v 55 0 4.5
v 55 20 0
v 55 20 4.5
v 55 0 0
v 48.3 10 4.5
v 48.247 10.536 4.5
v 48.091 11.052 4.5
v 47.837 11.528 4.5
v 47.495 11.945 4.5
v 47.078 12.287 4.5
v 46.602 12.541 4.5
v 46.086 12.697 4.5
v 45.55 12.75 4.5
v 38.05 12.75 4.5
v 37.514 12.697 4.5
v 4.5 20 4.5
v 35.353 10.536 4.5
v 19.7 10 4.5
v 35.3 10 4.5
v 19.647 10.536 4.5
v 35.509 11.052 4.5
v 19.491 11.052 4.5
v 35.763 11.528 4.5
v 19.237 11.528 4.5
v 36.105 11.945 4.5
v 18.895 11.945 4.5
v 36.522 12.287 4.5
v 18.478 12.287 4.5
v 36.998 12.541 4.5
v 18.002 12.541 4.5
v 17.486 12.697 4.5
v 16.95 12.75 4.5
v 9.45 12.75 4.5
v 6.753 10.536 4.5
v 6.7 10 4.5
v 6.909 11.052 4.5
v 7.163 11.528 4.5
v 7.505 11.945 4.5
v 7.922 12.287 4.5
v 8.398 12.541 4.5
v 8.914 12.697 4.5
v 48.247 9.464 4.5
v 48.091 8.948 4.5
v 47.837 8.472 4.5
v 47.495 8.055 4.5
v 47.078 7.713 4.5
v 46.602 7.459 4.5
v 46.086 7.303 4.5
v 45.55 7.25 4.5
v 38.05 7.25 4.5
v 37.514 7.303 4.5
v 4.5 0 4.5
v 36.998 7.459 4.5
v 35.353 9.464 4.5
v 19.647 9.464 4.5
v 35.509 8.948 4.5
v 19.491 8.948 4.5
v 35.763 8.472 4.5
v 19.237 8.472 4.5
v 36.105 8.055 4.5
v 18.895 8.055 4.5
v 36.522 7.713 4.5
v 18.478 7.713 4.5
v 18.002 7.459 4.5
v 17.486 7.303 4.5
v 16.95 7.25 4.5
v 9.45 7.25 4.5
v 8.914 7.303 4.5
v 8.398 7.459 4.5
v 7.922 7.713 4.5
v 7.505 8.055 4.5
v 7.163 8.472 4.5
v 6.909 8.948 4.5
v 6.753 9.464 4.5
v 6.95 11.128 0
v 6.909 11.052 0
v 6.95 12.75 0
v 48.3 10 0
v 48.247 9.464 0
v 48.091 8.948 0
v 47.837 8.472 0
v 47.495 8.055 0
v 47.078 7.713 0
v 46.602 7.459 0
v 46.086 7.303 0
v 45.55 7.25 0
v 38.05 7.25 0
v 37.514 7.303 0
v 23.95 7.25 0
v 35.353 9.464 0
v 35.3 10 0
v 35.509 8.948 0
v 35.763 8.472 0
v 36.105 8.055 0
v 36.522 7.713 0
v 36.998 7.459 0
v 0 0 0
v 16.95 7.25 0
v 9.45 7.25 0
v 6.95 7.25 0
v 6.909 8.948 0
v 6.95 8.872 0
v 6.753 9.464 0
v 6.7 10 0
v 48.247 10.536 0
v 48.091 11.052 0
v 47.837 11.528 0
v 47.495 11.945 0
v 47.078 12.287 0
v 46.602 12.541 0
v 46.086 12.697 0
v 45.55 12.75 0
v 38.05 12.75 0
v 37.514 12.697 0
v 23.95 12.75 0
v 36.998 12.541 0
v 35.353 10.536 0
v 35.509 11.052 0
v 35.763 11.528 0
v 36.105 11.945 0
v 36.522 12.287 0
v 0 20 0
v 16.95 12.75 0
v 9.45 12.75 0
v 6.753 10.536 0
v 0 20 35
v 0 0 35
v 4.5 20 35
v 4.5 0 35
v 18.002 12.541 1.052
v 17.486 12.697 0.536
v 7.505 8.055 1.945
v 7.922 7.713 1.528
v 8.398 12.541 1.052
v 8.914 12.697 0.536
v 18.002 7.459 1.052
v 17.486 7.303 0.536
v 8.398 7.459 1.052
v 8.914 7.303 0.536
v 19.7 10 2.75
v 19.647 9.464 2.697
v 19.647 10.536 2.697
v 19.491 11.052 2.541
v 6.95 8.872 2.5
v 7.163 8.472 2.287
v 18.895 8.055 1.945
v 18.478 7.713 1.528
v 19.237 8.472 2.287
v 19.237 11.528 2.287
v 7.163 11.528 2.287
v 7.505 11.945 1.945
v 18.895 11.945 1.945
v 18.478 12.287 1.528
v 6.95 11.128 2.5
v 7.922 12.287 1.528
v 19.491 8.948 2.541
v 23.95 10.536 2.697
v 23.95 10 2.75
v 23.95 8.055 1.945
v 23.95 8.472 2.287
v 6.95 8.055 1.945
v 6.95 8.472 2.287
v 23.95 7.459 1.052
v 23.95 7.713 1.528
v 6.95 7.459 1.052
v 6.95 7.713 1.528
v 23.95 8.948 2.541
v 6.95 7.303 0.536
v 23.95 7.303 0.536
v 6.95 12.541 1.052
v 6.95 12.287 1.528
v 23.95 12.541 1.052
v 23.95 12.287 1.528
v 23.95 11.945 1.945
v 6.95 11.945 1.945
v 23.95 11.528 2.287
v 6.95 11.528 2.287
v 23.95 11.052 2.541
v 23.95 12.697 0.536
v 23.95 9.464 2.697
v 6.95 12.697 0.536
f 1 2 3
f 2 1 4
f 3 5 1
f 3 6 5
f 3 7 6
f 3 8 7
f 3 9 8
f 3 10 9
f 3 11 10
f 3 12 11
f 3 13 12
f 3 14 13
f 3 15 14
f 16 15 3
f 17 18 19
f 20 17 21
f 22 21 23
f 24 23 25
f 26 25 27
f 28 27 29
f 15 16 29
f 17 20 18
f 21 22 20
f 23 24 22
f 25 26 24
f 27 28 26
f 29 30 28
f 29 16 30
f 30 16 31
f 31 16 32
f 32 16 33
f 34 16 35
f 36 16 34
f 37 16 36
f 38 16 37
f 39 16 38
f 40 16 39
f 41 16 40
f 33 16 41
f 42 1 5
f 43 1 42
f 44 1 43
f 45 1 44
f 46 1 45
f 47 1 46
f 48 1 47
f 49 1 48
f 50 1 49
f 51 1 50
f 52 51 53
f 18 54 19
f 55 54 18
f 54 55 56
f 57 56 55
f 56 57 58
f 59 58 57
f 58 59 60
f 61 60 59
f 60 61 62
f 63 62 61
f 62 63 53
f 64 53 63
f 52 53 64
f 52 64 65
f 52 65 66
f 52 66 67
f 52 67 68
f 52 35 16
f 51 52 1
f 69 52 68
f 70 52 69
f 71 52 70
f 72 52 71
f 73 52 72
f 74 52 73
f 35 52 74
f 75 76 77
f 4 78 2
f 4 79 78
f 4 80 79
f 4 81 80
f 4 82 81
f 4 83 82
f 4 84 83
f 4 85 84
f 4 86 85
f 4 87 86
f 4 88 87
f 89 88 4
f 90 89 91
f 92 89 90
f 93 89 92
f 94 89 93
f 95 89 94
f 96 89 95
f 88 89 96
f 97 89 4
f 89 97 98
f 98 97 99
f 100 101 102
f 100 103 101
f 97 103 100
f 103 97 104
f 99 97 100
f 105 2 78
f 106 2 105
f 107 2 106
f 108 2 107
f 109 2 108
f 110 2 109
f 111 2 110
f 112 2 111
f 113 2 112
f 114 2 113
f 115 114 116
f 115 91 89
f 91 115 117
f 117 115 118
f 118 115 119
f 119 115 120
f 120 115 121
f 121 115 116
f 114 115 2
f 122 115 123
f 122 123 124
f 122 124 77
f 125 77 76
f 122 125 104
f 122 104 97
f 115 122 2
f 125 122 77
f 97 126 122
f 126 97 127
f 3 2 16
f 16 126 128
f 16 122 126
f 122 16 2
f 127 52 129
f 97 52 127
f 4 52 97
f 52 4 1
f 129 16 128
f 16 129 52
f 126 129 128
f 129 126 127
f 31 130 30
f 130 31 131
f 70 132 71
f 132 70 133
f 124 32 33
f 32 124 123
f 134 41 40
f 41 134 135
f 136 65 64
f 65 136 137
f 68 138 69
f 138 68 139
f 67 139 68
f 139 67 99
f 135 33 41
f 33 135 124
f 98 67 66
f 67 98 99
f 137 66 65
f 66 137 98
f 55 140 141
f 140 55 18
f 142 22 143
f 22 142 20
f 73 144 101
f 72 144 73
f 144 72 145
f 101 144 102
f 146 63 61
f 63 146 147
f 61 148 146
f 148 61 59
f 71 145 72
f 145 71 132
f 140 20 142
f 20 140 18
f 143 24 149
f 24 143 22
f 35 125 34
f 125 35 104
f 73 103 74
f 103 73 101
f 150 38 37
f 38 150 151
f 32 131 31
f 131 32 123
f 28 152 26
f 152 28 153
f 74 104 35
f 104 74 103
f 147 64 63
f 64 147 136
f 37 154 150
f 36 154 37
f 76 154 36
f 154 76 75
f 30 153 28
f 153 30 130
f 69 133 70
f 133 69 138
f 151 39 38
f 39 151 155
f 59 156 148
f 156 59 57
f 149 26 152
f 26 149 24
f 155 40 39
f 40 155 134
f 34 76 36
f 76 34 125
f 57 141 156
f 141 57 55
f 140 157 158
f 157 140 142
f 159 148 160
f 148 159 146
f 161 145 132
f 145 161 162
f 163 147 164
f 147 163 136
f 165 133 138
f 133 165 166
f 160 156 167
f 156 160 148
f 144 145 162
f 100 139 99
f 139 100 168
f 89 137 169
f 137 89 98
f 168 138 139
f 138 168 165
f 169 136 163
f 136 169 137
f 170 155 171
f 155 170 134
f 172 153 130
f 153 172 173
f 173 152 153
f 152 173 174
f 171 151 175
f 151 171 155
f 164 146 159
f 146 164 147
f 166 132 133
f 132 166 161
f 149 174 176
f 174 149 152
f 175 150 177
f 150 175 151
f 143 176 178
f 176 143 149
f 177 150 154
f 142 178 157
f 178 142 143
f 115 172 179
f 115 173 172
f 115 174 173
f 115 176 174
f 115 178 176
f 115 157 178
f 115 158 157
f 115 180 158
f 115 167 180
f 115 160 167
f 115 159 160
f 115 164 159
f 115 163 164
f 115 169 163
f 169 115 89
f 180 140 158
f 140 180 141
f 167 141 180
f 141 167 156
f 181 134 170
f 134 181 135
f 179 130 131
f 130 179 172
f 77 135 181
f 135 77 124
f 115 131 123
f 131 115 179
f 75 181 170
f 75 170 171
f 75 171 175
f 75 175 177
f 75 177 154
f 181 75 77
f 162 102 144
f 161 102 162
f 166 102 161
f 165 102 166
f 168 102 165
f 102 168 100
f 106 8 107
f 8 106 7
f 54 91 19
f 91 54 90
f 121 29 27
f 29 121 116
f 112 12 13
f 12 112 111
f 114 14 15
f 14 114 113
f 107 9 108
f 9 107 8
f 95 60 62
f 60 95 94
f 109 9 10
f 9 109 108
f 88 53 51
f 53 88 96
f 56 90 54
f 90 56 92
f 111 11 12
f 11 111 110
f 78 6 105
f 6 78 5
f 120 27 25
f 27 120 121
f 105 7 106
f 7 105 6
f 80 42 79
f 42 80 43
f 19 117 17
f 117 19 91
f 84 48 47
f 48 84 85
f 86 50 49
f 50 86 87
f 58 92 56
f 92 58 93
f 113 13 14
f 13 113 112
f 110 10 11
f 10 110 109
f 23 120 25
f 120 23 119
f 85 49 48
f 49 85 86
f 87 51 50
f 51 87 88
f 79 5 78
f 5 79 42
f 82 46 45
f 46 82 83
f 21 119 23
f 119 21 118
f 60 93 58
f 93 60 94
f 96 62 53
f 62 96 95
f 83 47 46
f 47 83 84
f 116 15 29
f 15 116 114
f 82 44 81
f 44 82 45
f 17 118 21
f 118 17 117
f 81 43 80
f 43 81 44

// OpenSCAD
$fn = 32;

// ----------------------------------------------------------------------
// L-bracket: 55 x 20 x 35 mm
// ----------------------------------------------------------------------

// --- parameters (mm) ---
horiz_len = 55;           // horizontal leg, X
vert_len = 35;            // vertical leg, Z
profile_w = 20;           // bracket depth, Y
plate_t = 4.5;            // plate thickness
hole_d = 6.6;             // clearance for M6
slot_w = 5.5;             // euro screw slot width
slot_l = 13;              // euro screw slot length

module hole_z(px, py) {
  translate([px, py, -2.5]) cylinder(h = plate_t + 5, d = hole_d);
}
module hole_x(pz, py) {
  translate([-2.5, py, pz]) rotate([0, 90, 0]) cylinder(h = plate_t + 5, d = hole_d);
}
module euro_slot_z(px, py) {
  hull() {
    translate([px - (slot_l - slot_w) / 2, py, -2.5]) cylinder(h = plate_t + 5, d = slot_w);
    translate([px + (slot_l - slot_w) / 2, py, -2.5]) cylinder(h = plate_t + 5, d = slot_w);
  }
}
module euro_slot_x(pz, py) {
  translate([-2.5, 0, 0]) rotate([0, 90, 0]) hull() {
    translate([0, py, pz - (slot_l - slot_w) / 2]) cylinder(h = plate_t + 5, d = slot_w);
    translate([0, py, pz + (slot_l - slot_w) / 2]) cylinder(h = plate_t + 5, d = slot_w);
  }
}

difference() {
  union() {
    /* horizontal leg */
    cube([horiz_len, profile_w, plate_t]);
    /* vertical leg, overlapping the corner block */
    cube([plate_t, profile_w, vert_len]);
  }
  euro_slot_z(13.2, 10);
  euro_slot_x(13.2, 10);
  euro_slot_z(41.8, 10);
}
